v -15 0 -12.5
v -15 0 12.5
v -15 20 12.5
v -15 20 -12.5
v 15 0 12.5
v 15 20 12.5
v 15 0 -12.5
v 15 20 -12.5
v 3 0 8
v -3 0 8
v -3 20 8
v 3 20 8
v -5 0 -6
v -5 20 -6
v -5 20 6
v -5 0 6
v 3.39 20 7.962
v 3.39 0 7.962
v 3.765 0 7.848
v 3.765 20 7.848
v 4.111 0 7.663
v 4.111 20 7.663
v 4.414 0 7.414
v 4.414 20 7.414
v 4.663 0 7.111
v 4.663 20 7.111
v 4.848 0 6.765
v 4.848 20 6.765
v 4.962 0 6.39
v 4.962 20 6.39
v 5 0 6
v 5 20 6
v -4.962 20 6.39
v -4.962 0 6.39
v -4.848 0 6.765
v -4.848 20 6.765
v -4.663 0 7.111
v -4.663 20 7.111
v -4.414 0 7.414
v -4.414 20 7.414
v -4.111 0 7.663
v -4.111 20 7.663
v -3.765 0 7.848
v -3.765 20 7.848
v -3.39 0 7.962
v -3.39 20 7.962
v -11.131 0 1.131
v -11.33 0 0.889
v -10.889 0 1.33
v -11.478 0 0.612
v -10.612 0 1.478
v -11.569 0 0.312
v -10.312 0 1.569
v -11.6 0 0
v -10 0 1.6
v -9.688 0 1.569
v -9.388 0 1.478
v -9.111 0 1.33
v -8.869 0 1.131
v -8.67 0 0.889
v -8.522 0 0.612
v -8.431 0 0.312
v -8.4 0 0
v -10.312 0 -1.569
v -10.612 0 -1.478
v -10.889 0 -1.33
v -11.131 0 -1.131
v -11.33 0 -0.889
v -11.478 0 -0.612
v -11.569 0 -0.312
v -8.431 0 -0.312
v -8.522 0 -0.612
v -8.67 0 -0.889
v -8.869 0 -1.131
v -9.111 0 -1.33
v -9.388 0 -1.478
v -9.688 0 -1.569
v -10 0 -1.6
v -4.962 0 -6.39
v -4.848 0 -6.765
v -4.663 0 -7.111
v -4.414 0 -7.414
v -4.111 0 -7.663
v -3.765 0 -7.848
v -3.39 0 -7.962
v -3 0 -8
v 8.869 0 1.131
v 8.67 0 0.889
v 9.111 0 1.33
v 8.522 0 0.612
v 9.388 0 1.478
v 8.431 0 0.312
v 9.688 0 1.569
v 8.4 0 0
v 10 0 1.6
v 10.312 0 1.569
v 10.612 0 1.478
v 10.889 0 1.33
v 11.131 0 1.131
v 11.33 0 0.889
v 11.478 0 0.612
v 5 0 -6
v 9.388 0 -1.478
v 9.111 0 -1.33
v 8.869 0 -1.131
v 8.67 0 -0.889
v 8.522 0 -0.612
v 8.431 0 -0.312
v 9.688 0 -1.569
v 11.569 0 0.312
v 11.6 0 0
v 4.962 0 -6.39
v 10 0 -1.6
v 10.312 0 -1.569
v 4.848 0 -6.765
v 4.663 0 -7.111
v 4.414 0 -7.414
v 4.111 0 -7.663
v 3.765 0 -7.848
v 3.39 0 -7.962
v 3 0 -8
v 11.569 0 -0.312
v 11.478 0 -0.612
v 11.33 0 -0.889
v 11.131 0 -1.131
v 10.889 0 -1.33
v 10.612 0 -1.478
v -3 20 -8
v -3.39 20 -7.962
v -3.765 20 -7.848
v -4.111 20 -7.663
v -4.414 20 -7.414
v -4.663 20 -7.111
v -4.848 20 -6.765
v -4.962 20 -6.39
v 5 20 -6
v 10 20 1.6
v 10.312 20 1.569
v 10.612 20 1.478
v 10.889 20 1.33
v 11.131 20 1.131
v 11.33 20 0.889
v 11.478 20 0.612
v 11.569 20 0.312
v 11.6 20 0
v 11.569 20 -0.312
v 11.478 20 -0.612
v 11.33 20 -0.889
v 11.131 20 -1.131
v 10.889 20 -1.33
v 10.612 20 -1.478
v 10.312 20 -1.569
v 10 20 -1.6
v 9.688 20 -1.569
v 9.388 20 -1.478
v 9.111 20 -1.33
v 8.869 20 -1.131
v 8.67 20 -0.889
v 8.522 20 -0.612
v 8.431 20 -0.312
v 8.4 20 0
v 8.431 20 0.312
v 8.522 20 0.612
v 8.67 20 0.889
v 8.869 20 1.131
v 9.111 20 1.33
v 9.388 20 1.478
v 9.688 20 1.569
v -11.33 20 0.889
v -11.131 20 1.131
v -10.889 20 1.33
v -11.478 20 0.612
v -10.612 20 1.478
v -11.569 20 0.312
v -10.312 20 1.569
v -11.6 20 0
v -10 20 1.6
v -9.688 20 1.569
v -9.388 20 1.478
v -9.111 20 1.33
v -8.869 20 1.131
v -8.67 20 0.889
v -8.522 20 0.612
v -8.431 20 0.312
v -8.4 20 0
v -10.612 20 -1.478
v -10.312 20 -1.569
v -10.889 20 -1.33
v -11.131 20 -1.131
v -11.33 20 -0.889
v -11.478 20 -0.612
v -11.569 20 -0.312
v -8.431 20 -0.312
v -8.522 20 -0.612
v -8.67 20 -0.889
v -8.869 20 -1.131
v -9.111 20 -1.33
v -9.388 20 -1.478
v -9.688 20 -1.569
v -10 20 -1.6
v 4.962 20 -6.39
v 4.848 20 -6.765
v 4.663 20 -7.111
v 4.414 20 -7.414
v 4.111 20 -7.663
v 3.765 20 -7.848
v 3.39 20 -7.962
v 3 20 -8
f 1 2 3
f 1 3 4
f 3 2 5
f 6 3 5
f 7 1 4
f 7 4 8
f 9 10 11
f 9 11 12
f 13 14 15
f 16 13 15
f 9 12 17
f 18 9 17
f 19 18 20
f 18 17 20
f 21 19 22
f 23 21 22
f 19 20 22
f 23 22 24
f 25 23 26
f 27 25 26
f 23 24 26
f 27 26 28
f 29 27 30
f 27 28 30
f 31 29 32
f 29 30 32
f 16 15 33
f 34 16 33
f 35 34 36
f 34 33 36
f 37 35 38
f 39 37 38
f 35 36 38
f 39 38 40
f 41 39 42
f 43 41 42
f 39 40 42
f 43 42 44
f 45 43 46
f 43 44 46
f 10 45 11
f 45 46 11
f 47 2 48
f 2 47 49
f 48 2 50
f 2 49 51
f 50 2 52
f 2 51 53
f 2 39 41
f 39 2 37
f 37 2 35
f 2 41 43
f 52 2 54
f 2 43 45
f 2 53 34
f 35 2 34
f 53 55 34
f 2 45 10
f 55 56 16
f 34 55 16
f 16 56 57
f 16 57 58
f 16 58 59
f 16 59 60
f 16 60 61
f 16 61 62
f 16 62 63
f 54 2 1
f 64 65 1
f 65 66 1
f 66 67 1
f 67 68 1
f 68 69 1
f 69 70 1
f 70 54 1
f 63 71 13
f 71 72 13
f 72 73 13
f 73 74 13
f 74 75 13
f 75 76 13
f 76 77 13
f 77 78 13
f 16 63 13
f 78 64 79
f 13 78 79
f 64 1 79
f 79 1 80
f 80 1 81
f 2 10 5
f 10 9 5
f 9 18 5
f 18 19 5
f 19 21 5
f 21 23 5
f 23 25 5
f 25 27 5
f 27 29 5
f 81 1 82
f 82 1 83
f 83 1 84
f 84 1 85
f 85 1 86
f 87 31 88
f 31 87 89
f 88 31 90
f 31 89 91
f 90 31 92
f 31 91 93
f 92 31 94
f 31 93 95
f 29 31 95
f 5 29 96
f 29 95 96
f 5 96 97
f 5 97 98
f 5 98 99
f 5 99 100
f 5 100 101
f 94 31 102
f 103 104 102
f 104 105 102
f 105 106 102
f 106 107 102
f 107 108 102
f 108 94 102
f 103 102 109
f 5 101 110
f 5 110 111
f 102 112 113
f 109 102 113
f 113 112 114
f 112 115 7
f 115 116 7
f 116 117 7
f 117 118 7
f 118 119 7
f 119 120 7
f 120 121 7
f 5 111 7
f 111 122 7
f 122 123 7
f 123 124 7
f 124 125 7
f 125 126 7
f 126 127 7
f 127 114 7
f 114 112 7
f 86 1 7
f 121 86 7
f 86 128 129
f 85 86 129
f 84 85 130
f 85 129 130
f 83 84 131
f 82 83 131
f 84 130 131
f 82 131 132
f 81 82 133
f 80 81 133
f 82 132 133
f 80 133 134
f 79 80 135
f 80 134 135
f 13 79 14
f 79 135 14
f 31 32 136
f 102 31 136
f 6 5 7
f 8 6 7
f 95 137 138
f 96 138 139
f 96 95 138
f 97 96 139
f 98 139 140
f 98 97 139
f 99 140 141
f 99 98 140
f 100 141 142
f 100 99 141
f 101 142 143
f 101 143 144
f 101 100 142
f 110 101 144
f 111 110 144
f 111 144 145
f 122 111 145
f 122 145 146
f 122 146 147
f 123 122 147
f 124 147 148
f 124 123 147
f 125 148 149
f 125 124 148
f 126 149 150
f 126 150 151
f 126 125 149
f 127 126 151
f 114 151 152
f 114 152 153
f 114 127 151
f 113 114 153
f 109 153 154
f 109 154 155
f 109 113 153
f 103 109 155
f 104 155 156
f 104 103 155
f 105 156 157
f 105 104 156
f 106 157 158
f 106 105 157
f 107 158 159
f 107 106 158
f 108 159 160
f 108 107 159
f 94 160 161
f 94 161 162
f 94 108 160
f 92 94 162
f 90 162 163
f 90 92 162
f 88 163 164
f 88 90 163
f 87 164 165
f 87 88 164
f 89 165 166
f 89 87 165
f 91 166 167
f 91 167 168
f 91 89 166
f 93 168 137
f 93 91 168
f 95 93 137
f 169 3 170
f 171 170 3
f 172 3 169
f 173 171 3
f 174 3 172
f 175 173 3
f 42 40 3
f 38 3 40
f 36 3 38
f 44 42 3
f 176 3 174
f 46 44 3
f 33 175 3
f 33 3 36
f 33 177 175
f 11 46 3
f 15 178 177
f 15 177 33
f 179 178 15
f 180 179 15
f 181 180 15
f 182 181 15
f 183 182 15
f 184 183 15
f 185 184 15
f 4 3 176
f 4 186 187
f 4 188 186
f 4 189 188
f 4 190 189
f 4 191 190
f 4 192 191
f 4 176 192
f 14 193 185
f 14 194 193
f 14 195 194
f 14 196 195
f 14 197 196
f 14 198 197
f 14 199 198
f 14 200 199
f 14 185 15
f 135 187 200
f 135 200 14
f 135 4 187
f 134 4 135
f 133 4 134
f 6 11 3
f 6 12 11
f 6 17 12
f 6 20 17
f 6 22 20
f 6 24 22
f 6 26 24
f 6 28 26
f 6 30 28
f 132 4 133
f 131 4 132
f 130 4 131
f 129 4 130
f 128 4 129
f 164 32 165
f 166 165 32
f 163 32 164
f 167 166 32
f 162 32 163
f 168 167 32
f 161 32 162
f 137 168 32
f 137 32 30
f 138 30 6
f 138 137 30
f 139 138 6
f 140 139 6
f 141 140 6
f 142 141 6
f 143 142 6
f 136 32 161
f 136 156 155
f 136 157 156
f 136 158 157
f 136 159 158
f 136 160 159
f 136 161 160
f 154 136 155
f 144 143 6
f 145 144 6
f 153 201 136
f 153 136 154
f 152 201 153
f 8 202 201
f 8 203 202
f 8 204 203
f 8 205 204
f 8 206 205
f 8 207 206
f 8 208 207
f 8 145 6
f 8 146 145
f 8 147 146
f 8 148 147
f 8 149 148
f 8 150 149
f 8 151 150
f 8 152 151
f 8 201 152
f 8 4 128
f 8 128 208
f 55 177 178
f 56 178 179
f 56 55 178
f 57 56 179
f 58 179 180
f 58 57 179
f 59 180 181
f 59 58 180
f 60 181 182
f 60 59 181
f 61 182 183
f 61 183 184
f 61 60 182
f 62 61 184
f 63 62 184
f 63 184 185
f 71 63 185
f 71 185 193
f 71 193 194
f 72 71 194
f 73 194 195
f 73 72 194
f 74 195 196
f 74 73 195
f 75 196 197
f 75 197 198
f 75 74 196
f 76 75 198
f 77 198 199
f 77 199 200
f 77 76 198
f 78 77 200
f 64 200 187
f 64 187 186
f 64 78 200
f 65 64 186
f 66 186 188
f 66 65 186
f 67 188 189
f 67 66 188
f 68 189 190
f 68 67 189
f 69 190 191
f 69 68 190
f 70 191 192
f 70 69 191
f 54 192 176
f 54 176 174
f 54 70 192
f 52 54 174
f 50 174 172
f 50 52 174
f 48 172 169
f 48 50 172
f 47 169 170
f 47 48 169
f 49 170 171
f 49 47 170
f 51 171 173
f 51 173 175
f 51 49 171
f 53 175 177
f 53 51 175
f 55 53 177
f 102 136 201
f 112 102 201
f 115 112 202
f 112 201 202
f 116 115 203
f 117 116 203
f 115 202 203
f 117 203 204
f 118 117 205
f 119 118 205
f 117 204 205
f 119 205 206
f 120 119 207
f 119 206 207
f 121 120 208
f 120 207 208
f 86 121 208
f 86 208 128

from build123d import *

# Parameters (mm, degrees)
SKETCH_1_W          = 30
SKETCH_1_H          = 25
SKETCH_1_R          = 1.6
EXTRUDE_1_DEPTH     = 20
CUT_EXTRUDE_1_DEPTH = 20


with BuildPart() as part:
    # 草图1 → 凸台-拉伸1 (new body)
    with BuildSketch(Plane(origin=(0, 0, 0), x_dir=(1, 0, 0), z_dir=(0, 1, 0))):
        Rectangle(SKETCH_1_W, SKETCH_1_H)
        with Locations(Location((-10, 0, 0), (0, 0, 270))):
            Circle(SKETCH_1_R, mode=Mode.SUBTRACT)
        with Locations(Location((10, 0, 0), (0, 0, 270))):
            Circle(SKETCH_1_R, mode=Mode.SUBTRACT)
    extrude(amount=EXTRUDE_1_DEPTH)

    # 草图2 → 切除-拉伸1 (cut)
    with BuildSketch(Plane(origin=(0, 20, 0), x_dir=(1, 0, 0), z_dir=(0, 1, 0))):
        with BuildLine():
            Line((-3, -8), (3, -8))
            ThreePointArc((3, -8), (4.414213562, -7.414213562), (5, -6))
            Line((5, -6), (5, 6))
            ThreePointArc((5, 6), (4.414213562, 7.414213562), (3, 8))
            Line((3, 8), (-3, 8))
            ThreePointArc((-3, 8), (-4.414213562, 7.414213562), (-5, 6))
            Line((-5, 6), (-5, -6))
            ThreePointArc((-5, -6), (-4.414213562, -7.414213562), (-3, -8))
        make_face()
    extrude(amount=-CUT_EXTRUDE_1_DEPTH, mode=Mode.SUBTRACT)


solid = part.part
